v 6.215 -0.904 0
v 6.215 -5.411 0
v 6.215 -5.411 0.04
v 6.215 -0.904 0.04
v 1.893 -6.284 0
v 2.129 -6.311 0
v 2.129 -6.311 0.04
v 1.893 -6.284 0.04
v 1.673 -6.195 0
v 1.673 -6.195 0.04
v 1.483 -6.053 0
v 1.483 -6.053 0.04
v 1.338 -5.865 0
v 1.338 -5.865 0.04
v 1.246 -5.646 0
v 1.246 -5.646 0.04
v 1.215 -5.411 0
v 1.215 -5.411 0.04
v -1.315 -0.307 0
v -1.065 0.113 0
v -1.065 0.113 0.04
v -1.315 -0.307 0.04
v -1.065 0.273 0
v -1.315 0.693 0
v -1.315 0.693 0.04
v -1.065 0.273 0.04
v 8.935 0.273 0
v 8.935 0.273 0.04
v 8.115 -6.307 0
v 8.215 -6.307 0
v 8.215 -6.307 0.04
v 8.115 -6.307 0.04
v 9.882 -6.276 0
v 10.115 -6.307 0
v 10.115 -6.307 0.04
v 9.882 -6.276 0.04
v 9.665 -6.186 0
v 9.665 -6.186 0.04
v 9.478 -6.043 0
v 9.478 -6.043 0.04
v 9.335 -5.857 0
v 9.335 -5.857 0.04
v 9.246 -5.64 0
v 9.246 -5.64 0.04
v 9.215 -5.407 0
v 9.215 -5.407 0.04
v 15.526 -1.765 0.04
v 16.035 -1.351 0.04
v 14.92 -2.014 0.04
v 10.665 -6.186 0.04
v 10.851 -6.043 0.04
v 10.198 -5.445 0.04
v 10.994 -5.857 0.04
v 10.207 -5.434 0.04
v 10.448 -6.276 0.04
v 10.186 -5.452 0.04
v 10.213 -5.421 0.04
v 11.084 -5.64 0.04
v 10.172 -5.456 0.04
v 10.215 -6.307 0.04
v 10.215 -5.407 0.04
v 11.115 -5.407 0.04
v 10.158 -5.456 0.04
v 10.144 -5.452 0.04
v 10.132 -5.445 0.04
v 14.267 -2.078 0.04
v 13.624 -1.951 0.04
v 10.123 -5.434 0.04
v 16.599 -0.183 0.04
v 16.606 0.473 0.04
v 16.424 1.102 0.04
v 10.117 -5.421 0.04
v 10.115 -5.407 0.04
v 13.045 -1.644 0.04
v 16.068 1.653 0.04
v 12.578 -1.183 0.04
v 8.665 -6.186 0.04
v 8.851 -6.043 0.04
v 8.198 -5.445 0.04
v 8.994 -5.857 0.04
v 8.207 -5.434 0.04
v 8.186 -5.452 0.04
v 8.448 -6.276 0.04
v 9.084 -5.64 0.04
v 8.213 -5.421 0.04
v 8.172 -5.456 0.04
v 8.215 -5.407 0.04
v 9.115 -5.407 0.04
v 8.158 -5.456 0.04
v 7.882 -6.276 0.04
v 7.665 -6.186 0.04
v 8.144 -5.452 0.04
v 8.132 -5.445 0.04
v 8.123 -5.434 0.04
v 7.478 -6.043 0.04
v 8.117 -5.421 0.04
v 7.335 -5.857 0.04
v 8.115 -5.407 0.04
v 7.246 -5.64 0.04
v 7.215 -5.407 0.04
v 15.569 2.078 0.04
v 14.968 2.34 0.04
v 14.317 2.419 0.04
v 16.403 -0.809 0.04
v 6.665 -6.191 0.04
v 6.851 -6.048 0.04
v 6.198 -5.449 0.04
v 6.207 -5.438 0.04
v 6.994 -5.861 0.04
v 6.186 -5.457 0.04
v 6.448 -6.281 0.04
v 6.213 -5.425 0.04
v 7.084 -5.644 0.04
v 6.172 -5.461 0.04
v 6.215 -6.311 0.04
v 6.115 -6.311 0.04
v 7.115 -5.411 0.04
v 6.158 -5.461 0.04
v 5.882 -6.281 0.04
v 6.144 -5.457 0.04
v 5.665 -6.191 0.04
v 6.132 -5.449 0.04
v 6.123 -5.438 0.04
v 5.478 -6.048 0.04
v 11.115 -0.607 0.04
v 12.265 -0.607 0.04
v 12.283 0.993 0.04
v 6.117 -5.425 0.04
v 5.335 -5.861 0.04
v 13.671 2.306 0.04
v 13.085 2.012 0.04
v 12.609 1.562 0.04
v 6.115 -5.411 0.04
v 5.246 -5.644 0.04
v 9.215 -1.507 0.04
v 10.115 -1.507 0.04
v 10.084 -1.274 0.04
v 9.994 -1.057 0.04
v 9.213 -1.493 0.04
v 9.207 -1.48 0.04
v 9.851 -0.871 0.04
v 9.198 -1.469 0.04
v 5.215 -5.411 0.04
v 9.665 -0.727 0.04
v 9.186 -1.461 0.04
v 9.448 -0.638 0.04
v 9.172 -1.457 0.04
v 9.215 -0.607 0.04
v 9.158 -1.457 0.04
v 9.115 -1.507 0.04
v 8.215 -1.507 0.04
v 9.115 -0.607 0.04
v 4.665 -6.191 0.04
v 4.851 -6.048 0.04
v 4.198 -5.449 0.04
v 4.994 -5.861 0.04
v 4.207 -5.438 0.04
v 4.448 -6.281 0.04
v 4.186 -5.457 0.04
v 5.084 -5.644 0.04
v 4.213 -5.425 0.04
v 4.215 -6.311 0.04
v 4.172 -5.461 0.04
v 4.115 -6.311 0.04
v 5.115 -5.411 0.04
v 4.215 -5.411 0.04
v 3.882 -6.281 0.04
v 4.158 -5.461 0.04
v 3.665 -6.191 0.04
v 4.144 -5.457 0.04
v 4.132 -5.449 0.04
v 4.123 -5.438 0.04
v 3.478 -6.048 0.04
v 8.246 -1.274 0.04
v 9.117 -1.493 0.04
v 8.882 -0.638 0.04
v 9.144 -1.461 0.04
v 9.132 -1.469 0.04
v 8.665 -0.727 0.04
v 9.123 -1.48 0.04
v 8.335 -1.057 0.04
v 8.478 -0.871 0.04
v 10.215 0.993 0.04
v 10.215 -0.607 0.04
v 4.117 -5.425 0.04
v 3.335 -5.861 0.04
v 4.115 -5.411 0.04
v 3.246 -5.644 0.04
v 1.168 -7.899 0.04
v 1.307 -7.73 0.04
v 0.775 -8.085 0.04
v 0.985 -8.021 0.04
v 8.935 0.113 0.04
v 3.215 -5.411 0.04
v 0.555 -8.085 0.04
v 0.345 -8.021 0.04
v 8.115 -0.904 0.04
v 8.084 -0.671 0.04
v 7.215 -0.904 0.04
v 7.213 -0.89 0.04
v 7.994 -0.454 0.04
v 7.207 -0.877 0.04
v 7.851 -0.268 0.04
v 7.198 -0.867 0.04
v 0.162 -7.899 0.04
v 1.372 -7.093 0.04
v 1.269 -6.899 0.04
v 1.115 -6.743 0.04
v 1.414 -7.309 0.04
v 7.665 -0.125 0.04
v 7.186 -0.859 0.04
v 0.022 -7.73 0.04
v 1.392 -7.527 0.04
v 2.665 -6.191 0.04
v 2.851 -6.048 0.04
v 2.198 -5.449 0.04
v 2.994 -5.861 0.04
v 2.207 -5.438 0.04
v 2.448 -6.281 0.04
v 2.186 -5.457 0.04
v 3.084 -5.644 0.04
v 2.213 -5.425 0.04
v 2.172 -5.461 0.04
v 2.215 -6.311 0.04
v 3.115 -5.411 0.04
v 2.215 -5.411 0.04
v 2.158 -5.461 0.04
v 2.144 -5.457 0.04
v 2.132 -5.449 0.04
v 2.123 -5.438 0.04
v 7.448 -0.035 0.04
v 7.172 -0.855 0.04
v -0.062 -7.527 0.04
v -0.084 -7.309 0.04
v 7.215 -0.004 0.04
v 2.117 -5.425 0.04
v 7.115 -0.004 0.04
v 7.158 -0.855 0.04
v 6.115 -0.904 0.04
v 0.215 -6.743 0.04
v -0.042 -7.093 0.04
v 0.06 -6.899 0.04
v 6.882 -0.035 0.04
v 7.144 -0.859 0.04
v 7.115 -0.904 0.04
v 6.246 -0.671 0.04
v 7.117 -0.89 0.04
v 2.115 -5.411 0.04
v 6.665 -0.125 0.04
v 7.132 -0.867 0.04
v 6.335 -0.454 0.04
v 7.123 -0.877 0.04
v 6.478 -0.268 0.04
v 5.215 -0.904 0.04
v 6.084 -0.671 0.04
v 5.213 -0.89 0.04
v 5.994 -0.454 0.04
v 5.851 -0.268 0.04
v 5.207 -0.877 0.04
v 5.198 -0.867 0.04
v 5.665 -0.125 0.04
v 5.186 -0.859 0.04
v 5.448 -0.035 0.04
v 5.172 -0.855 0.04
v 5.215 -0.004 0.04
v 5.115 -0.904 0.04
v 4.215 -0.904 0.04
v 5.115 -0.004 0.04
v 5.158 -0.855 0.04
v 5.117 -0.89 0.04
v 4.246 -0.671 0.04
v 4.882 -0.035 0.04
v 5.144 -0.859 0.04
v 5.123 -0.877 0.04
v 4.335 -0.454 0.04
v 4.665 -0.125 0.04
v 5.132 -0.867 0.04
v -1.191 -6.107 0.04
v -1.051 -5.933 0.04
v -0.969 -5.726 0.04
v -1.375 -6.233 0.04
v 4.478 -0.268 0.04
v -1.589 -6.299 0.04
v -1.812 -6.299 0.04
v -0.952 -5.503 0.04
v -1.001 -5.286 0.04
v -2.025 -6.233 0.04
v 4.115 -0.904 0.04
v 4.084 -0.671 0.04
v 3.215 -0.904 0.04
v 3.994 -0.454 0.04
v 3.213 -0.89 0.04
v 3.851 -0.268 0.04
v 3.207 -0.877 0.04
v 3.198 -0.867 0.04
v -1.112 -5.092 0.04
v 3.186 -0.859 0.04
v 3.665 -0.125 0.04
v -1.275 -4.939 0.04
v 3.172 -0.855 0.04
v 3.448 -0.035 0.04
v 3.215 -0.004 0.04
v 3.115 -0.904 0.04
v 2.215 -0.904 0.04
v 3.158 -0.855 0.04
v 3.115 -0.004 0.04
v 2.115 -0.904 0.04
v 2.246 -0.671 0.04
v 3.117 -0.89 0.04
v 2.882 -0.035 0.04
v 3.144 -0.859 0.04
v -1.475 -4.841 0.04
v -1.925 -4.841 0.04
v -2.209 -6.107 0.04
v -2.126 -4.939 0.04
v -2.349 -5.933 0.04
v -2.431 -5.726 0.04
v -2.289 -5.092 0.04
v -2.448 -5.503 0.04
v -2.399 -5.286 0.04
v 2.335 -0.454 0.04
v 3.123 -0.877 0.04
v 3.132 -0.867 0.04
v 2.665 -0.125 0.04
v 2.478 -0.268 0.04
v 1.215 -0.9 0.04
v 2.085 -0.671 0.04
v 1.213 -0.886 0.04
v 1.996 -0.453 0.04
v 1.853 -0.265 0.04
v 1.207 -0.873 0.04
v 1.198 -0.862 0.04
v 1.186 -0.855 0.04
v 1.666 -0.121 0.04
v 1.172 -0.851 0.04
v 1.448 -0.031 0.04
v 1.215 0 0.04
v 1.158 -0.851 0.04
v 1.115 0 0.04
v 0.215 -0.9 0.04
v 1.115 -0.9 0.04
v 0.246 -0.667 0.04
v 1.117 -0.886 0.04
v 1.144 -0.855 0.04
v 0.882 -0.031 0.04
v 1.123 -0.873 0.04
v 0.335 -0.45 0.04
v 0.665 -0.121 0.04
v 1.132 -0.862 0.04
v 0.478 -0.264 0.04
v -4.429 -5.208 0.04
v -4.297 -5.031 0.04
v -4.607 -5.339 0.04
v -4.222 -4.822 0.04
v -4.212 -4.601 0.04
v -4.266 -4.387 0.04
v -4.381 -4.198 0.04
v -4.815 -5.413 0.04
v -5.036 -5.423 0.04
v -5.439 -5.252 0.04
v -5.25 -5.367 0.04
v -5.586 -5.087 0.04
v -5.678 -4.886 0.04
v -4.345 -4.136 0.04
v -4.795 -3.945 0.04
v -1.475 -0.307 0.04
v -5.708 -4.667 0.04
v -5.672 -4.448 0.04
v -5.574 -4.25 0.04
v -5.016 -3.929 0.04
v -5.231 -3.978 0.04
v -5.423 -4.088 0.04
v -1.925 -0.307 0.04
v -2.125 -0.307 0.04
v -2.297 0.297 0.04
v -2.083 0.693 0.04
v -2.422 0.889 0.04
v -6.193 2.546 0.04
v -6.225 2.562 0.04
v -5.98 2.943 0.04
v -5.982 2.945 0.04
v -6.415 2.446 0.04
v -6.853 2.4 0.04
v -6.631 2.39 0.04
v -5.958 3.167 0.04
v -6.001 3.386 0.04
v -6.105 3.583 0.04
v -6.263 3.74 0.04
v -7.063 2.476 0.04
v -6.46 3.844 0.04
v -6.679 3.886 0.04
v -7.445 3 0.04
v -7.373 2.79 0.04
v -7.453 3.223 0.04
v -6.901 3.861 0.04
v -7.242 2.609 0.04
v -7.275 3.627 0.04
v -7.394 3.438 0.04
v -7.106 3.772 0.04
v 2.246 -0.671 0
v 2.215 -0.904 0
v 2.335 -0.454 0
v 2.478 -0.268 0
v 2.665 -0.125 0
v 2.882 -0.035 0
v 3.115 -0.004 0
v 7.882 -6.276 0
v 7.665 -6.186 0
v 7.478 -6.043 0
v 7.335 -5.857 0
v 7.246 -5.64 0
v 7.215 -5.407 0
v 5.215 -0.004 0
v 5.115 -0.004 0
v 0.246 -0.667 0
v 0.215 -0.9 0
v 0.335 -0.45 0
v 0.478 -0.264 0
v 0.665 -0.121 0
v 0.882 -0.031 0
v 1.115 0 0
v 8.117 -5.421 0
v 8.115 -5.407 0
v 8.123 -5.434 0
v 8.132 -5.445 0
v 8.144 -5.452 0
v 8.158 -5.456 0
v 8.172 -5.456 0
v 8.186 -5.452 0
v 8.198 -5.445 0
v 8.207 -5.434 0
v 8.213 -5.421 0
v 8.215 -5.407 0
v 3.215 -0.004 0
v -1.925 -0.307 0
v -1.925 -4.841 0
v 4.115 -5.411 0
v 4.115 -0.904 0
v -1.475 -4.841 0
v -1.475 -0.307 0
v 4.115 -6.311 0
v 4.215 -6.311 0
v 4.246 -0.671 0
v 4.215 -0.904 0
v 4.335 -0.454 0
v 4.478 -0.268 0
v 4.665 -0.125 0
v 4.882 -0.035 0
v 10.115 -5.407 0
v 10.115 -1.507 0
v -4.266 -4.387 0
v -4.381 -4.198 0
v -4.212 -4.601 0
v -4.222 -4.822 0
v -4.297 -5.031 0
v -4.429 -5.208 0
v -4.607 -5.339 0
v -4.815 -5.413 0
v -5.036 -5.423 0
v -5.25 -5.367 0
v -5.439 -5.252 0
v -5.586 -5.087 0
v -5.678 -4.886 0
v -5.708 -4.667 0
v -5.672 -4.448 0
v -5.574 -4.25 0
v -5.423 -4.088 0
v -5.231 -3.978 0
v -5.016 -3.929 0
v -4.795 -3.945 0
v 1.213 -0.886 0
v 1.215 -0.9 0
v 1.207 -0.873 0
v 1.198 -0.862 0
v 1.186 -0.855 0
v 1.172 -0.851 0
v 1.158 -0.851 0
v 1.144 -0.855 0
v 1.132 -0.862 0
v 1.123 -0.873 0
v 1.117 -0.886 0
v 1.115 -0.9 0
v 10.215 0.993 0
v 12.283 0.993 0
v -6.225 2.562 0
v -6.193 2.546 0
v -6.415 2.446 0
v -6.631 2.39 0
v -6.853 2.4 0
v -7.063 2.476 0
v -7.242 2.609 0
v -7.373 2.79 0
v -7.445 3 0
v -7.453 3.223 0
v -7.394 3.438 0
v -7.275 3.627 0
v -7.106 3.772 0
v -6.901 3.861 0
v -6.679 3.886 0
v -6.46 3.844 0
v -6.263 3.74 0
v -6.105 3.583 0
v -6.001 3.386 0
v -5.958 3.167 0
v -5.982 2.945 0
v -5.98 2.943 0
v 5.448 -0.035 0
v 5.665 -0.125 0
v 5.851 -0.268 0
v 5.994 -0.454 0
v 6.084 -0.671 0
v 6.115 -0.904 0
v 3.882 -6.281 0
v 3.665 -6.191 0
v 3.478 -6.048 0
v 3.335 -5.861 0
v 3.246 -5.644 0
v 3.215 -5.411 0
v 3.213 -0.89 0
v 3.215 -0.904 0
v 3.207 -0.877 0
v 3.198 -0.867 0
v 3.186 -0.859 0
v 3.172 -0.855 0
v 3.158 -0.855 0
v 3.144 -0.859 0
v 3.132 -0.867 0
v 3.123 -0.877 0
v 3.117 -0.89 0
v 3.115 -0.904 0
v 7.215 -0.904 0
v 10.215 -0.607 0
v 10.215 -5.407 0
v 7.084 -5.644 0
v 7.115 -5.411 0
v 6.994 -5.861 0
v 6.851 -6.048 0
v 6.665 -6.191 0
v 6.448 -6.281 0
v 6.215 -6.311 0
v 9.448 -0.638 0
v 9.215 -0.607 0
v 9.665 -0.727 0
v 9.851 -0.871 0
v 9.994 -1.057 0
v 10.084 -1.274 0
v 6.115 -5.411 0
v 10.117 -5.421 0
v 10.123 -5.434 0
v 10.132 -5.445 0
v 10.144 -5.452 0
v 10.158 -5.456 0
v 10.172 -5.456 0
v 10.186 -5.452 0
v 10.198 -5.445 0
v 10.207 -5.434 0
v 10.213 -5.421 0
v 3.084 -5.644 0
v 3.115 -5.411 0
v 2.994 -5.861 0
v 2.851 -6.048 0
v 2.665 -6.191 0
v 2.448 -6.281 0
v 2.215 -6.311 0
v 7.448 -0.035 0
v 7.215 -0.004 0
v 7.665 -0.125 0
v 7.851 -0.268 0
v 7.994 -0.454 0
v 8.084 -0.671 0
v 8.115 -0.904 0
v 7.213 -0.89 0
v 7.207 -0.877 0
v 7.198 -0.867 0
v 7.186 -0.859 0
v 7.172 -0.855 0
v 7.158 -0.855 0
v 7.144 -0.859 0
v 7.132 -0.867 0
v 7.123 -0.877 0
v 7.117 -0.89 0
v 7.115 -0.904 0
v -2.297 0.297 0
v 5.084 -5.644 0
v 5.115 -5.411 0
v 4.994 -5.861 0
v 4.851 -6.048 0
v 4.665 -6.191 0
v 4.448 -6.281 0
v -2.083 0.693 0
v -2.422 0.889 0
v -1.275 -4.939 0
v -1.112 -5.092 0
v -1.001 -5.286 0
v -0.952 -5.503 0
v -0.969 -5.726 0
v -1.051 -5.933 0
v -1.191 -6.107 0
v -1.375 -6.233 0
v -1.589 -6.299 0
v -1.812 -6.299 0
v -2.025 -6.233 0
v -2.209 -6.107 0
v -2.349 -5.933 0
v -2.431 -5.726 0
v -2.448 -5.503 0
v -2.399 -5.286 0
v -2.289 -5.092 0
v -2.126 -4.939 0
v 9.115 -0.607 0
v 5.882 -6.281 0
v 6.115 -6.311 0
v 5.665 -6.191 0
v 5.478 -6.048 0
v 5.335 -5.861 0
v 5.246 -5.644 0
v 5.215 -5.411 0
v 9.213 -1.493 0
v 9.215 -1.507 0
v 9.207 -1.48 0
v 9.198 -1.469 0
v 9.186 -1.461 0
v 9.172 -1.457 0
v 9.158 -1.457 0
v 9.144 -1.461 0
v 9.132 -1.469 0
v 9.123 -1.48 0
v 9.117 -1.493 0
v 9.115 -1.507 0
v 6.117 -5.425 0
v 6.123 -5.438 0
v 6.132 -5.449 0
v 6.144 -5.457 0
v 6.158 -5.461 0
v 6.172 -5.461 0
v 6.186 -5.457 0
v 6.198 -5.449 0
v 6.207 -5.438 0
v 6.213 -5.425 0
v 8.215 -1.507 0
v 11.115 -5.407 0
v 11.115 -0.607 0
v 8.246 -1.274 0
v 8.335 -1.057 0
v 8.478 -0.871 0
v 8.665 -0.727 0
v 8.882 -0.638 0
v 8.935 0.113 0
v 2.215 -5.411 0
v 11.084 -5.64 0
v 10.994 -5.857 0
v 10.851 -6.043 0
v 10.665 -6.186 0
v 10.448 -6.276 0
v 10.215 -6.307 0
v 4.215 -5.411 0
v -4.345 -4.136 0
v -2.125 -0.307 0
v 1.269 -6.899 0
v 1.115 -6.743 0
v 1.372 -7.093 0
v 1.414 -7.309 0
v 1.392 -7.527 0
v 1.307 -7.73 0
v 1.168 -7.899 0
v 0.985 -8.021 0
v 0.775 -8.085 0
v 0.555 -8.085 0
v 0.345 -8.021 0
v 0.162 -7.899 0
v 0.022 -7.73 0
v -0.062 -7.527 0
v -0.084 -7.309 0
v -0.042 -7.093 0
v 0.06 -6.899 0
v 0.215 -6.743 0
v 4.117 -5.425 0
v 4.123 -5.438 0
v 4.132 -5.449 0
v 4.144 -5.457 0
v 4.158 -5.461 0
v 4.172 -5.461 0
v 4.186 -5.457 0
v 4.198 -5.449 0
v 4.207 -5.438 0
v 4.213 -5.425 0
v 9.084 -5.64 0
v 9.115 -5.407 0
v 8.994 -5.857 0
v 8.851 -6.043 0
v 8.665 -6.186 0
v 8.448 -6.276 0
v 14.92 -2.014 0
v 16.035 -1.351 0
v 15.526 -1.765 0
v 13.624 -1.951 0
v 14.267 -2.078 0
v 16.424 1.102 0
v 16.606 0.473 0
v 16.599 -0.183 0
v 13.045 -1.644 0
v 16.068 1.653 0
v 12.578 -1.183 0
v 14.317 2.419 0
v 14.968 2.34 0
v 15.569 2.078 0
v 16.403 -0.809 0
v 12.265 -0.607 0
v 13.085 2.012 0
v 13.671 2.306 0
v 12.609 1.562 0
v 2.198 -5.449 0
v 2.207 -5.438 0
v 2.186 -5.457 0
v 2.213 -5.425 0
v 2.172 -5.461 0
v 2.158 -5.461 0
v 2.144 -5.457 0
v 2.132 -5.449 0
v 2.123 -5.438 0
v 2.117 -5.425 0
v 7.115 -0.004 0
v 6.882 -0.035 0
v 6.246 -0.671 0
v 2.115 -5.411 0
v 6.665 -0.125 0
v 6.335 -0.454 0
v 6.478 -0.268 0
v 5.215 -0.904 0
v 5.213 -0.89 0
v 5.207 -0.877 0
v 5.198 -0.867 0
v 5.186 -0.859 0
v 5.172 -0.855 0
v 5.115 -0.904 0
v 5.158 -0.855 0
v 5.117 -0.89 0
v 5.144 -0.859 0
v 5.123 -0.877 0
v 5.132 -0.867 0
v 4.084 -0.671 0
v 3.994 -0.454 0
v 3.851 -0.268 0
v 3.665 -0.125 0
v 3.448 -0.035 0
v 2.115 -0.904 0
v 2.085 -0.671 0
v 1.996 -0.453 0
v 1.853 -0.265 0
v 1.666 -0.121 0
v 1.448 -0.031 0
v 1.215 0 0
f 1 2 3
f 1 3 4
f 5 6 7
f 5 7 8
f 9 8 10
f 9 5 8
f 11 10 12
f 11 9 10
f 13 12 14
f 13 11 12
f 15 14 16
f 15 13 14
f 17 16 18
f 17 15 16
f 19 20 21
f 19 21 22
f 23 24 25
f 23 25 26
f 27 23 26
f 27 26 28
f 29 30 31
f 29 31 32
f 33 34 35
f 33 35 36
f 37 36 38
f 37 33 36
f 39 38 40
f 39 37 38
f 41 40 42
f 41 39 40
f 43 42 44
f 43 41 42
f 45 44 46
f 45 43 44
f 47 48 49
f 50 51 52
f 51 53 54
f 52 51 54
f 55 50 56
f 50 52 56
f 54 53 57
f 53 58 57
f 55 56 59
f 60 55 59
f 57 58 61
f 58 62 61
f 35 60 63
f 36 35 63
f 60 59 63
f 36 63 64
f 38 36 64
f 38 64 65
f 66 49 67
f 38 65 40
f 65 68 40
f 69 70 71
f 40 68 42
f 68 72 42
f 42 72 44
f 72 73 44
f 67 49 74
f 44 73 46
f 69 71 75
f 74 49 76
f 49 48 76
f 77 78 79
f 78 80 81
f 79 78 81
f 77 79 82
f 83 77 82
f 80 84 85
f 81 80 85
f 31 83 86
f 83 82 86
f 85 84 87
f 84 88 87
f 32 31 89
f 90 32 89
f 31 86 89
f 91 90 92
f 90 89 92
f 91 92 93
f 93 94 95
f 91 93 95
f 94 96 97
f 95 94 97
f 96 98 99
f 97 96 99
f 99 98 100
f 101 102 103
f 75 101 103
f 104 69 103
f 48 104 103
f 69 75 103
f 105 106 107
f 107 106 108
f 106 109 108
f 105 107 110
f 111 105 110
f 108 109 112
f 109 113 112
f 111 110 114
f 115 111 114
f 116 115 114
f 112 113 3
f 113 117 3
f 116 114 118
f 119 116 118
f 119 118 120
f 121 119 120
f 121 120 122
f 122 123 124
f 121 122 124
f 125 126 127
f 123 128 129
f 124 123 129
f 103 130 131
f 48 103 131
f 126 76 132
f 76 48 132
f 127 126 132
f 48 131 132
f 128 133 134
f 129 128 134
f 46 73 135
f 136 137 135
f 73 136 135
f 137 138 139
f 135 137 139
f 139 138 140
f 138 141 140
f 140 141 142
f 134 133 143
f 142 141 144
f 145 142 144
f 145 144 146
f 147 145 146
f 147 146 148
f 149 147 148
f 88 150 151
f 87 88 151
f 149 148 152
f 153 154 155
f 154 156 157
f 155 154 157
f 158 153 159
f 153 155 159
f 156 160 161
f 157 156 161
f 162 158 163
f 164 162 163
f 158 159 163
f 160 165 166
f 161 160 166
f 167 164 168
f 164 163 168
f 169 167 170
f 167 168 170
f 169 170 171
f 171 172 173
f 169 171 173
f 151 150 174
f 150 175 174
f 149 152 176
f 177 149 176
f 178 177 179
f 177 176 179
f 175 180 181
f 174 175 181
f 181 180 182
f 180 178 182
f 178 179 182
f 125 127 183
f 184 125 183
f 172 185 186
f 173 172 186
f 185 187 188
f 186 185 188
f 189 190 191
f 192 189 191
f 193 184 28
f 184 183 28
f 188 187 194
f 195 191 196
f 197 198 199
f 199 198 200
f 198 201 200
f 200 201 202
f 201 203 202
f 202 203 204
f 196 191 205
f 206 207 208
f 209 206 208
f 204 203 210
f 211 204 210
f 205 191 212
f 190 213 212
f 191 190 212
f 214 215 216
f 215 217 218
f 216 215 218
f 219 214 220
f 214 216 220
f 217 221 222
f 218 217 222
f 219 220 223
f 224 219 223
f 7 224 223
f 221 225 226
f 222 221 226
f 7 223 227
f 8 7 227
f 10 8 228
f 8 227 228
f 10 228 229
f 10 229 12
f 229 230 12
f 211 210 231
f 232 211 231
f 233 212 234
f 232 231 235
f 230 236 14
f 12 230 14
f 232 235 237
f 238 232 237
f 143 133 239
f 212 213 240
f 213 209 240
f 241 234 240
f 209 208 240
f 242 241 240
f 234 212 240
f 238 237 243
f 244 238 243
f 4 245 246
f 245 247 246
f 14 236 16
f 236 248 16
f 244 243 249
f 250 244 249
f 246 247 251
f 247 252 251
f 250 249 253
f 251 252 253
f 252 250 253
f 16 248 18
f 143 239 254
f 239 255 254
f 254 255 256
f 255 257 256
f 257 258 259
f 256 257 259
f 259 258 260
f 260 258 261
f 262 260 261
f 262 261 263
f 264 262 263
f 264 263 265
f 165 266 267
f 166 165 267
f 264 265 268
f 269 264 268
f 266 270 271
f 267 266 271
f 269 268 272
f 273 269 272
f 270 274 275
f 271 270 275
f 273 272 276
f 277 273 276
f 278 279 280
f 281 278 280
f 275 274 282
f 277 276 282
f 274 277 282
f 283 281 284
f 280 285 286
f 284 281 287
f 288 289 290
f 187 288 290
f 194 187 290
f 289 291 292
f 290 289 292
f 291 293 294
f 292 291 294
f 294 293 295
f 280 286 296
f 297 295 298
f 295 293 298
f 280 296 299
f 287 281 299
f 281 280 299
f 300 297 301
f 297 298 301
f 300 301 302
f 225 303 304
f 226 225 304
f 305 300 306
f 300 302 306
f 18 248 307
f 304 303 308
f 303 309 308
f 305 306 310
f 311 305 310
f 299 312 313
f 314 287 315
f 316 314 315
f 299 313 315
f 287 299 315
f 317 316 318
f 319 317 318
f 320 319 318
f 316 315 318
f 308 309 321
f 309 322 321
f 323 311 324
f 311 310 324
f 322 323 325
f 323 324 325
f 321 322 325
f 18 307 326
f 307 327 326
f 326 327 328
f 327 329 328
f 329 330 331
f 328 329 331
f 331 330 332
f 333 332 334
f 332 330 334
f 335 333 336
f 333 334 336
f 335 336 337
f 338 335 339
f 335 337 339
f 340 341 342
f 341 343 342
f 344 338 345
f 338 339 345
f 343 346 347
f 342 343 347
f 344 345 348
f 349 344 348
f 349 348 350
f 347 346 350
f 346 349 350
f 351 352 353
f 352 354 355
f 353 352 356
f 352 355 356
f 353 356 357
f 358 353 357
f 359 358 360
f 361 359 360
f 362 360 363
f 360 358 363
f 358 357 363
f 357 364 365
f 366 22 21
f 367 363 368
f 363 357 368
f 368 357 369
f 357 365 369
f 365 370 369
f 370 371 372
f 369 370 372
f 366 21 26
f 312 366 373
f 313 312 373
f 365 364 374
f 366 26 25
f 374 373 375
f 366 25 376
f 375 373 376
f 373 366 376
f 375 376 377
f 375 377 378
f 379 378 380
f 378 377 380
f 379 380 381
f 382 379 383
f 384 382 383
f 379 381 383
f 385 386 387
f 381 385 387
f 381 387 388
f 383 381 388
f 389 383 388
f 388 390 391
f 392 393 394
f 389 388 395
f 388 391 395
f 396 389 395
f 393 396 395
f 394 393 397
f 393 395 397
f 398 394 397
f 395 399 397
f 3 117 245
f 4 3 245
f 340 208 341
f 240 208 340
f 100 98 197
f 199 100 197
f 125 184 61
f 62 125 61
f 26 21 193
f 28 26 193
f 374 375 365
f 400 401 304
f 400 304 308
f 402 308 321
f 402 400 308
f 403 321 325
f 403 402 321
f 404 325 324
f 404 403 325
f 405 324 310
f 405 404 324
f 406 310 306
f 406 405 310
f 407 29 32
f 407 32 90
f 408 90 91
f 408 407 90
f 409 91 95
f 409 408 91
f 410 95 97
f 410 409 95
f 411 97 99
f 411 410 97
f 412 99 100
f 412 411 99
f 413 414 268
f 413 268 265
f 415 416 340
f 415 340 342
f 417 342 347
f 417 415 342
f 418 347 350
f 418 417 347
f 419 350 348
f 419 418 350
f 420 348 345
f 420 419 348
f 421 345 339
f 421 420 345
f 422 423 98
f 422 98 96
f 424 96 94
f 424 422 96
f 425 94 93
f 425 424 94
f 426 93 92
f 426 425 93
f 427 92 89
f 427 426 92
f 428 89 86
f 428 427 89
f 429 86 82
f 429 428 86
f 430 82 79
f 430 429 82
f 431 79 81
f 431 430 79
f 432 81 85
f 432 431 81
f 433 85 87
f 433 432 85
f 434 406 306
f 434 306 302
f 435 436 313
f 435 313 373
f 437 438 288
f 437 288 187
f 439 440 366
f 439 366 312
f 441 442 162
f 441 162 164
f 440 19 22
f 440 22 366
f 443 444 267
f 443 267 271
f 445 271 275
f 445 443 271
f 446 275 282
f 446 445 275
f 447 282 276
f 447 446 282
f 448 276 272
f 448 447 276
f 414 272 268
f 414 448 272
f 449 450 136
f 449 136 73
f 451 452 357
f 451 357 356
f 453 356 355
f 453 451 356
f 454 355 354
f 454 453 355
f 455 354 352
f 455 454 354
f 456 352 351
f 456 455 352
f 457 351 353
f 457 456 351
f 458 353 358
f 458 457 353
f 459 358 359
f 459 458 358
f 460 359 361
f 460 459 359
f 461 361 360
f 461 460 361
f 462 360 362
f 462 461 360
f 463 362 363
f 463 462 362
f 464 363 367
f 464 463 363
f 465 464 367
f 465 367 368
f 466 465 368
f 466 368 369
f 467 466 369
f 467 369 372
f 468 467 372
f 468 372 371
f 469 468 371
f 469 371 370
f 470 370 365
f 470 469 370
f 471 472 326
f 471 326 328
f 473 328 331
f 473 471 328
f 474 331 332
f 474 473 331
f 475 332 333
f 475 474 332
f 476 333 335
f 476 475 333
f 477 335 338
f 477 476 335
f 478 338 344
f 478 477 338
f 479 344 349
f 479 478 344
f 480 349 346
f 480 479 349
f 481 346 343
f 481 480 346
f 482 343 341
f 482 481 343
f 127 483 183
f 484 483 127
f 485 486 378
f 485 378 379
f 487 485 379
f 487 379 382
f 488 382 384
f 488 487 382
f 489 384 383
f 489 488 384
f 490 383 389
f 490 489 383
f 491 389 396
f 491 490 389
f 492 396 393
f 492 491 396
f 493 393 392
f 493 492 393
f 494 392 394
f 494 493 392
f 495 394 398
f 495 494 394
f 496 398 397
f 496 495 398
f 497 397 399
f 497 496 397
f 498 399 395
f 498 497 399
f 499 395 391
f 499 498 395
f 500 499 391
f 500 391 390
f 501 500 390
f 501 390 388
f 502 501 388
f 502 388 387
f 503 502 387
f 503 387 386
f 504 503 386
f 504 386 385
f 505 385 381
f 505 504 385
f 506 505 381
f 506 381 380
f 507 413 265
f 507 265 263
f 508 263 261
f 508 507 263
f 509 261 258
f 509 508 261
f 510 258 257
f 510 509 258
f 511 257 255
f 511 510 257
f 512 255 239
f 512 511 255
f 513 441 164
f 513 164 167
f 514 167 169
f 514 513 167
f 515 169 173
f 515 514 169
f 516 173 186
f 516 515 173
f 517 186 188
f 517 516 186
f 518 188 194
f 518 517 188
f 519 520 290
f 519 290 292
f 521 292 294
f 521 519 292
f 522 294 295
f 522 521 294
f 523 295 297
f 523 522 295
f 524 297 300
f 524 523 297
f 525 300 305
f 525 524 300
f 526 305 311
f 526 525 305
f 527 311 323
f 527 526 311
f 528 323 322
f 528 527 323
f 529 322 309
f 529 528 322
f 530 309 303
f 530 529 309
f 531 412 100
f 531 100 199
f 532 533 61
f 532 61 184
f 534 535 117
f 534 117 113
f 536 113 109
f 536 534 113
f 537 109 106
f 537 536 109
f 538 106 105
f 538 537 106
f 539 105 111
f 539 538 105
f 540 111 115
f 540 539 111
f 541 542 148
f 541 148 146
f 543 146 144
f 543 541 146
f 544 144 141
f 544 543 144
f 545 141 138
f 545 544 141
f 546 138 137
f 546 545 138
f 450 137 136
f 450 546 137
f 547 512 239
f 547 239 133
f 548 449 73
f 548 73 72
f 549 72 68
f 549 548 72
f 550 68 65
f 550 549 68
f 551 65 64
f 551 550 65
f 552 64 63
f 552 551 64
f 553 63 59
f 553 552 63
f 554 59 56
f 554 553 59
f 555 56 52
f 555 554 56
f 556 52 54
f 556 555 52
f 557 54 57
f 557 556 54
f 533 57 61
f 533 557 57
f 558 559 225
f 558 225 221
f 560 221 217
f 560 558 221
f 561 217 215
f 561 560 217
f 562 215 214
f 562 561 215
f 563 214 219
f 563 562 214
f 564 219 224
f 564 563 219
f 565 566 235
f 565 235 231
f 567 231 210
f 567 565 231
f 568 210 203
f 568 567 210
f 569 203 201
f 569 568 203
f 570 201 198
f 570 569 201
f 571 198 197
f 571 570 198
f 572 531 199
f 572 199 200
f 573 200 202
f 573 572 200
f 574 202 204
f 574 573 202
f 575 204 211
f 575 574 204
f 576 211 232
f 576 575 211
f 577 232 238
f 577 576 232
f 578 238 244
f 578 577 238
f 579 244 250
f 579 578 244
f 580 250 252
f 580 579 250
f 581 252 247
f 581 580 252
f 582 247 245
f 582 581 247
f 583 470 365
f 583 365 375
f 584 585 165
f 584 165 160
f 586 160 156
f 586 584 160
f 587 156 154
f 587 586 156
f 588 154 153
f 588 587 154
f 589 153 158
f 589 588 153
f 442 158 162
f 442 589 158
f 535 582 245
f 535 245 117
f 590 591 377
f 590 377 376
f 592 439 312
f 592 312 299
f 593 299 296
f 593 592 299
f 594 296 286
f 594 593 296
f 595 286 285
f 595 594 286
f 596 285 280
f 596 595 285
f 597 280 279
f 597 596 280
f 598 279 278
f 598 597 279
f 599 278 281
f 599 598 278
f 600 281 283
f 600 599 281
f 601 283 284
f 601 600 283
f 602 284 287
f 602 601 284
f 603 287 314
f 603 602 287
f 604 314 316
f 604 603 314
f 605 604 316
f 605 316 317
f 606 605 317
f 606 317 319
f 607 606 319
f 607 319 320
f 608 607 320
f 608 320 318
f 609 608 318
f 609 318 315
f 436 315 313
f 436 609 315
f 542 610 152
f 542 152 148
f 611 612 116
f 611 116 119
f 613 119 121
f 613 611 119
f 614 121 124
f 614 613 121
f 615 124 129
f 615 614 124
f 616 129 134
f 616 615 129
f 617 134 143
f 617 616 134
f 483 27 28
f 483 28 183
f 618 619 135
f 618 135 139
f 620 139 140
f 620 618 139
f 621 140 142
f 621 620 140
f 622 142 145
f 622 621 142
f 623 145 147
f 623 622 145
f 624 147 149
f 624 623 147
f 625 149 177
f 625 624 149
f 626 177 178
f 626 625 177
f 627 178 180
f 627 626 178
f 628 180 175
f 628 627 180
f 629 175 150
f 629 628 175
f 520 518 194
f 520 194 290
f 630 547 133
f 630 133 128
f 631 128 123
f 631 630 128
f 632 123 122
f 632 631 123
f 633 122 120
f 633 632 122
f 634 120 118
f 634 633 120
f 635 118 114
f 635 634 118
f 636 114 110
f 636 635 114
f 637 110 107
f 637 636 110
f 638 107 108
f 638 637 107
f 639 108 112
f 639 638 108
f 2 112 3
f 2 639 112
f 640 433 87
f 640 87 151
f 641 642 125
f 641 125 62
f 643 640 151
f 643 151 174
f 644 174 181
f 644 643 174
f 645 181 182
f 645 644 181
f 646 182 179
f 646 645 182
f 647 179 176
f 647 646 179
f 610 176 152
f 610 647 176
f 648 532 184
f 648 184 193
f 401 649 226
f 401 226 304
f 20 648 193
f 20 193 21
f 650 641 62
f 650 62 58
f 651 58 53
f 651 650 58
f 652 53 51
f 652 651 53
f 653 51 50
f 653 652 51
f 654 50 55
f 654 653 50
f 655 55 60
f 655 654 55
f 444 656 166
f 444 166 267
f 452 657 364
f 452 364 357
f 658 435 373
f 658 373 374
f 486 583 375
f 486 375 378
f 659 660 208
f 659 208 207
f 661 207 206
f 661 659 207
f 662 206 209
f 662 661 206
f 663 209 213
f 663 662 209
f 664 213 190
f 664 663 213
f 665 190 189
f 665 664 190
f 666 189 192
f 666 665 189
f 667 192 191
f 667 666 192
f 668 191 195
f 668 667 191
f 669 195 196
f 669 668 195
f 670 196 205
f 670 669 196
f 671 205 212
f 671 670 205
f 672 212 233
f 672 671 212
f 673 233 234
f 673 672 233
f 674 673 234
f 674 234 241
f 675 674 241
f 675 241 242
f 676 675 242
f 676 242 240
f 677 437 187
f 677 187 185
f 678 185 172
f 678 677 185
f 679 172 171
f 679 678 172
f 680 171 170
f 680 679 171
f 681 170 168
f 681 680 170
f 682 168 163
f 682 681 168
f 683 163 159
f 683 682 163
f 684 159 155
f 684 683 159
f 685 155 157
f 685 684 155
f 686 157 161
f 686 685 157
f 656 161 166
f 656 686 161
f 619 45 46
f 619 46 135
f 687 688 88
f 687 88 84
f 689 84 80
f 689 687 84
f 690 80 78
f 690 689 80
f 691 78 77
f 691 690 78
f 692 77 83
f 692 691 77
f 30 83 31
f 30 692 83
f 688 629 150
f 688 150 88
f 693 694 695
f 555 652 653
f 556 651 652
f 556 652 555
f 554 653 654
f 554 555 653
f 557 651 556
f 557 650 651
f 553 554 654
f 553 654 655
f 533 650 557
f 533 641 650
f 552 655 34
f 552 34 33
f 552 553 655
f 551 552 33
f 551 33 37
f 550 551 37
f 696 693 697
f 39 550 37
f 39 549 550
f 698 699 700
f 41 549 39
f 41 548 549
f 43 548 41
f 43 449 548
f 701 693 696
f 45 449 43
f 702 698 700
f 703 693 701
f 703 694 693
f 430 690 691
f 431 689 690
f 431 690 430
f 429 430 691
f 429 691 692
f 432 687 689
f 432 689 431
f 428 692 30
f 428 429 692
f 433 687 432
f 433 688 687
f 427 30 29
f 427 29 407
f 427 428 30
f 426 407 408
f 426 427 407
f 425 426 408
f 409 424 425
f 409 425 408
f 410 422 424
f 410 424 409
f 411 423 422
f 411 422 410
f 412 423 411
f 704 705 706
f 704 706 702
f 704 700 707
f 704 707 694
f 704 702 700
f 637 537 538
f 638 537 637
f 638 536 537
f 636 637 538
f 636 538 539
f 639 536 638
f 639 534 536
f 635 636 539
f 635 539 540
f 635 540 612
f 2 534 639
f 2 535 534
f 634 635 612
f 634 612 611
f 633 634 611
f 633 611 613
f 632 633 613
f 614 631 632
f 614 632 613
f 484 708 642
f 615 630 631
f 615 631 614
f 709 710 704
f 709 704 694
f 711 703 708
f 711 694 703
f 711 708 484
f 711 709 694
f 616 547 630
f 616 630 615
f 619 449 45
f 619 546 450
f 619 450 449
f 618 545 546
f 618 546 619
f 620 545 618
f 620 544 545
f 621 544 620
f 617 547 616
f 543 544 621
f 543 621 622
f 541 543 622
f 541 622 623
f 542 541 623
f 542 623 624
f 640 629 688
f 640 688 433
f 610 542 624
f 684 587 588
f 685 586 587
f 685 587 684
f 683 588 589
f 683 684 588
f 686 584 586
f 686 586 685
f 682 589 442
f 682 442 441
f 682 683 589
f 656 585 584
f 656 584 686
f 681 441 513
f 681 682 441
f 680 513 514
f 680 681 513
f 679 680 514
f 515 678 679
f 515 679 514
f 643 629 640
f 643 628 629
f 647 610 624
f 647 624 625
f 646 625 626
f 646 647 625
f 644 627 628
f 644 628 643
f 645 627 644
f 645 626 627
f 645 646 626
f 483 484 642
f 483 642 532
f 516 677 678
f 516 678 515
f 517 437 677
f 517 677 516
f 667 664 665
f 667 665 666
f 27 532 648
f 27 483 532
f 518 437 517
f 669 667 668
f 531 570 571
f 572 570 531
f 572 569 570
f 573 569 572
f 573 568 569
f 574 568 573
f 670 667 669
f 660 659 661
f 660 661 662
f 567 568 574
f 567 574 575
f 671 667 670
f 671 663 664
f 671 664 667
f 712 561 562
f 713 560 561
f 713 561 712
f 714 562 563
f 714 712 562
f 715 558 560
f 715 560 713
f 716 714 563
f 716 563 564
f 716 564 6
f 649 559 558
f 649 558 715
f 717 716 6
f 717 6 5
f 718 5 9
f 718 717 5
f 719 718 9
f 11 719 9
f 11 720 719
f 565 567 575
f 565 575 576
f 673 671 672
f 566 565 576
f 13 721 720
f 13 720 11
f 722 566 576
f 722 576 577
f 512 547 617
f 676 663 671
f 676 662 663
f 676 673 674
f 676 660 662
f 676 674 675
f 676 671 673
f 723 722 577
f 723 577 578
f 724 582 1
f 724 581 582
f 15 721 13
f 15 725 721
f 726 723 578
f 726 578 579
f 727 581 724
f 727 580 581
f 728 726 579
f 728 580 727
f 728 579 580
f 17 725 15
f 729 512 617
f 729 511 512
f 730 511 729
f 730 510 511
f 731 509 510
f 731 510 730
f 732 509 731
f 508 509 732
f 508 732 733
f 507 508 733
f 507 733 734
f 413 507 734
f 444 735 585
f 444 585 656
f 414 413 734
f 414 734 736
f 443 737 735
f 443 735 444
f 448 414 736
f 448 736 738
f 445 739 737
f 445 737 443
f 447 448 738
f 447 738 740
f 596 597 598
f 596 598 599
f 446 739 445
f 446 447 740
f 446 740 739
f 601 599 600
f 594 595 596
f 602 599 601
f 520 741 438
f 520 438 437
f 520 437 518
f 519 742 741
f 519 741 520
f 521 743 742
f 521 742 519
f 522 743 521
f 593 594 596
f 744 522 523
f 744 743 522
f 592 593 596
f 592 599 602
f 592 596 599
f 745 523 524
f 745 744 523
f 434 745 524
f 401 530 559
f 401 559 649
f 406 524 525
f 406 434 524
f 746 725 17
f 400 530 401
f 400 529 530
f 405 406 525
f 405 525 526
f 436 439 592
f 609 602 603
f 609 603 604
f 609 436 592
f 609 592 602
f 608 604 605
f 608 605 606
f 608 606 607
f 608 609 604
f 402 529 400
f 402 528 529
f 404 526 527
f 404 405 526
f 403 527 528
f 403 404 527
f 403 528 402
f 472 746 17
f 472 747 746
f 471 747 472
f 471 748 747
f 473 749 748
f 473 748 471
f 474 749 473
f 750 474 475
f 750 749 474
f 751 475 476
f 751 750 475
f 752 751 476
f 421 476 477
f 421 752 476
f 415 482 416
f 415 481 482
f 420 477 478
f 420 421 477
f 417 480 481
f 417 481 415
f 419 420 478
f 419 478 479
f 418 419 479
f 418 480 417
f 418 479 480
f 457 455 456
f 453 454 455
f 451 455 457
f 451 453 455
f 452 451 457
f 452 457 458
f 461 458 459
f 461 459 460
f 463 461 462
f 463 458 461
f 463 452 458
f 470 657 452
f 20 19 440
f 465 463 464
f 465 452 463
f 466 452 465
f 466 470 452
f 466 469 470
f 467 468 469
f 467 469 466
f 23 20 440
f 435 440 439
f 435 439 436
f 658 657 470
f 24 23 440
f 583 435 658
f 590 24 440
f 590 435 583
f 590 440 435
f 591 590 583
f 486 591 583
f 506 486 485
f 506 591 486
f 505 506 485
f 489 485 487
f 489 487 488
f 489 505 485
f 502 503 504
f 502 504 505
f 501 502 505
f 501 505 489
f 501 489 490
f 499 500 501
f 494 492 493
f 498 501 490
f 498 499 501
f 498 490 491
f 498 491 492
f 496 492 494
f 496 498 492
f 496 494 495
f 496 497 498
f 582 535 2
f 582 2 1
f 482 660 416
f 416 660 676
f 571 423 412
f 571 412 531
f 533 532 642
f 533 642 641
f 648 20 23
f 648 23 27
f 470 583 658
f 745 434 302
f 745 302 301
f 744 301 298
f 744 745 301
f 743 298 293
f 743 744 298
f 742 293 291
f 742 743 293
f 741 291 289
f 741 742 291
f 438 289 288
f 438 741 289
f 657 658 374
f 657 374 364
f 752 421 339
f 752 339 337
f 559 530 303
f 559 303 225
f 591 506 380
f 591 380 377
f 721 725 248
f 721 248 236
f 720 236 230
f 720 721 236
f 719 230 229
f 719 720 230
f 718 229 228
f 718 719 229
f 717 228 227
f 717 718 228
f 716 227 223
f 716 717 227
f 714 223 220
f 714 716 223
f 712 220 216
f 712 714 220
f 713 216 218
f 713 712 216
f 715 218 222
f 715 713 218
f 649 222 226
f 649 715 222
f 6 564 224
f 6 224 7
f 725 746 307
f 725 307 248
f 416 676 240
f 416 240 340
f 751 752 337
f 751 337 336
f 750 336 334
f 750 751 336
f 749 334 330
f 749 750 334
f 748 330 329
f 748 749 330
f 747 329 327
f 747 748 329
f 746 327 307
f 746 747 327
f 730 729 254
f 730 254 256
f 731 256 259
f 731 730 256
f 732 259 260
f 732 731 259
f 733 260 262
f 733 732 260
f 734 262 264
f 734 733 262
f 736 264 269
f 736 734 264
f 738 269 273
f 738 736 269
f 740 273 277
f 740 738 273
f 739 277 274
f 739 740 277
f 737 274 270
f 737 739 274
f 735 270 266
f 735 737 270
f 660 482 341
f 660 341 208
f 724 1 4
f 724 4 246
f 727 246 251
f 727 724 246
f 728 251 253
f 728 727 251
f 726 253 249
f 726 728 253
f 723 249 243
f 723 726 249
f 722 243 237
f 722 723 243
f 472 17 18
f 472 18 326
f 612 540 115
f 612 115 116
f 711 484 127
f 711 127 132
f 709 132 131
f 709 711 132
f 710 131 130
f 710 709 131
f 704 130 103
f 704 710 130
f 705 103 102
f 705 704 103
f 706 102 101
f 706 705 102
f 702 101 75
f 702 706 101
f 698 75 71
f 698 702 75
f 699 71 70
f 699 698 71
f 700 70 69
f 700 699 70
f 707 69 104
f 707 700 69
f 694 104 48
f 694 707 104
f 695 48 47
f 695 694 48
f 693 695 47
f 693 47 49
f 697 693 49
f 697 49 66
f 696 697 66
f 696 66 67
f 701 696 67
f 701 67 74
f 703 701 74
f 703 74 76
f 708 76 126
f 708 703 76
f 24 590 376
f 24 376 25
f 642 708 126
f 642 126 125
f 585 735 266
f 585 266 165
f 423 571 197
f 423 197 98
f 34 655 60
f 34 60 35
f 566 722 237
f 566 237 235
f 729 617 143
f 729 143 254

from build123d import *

# Parameters (mm, degrees)
BOSS_EXTRUDE1_DEPTH = 0.04


with BuildPart() as part:
    # Sketch1 → Boss-Extrude1 (new body)
    with BuildSketch(Plane.XY):
        with BuildLine():
            Line((-1.315144017, 0.693084069), (-1.065144017, 0.273084069))
            Line((-1.065144017, 0.273084069), (8.934855983, 0.273084069))
            Line((8.934855983, 0.273084069), (10.214855983, 0.993084069))
            Line((10.214855983, 0.993084069), (10.514506575, 0.993084069))
            Line((10.514506575, 0.993084069), (10.935378928, 0.993084069))
            Line((10.935378928, 0.993084069), (12.282731088, 0.993084069))
            ThreePointArc((12.282731088, 0.993084069), (16.626477002, 0.144456147), (12.264855983, -0.606915931))
            Line((12.264855983, -0.606915931), (11.114855983, -0.606915931))
            Line((11.114855983, -0.606915931), (11.114855983, -5.406915931))
            ThreePointArc((11.114855983, -5.406915931), (10.851252086, -6.043312034), (10.214855983, -6.306915931))
            Line((10.214855983, -6.306915931), (10.114855983, -6.306915931))
            ThreePointArc((10.114855983, -6.306915931), (9.47845988, -6.043312034), (9.214855983, -5.406915931))
            Line((9.214855983, -5.406915931), (9.214855983, -1.506915931))
            ThreePointArc((9.214855983, -1.506915931), (9.164855983, -1.456915931), (9.114855983, -1.506915931))
            Line((9.114855983, -1.506915931), (9.114855983, -5.406915931))
            ThreePointArc((9.114855983, -5.406915931), (8.851252086, -6.043312034), (8.214855983, -6.306915931))
            Line((8.214855983, -6.306915931), (8.114855983, -6.306915931))
            ThreePointArc((8.114855983, -6.306915931), (7.47845988, -6.043312034), (7.214855983, -5.406915931))
            Line((7.214855983, -5.406915931), (7.214855983, -0.904335528))
            ThreePointArc((7.214855983, -0.904335528), (7.164855983, -0.854335528), (7.114855983, -0.904335528))
            Line((7.114855983, -0.904335528), (7.114855983, -5.4112515))
            ThreePointArc((7.114855983, -5.4112515), (6.851252086, -6.047647603), (6.214855983, -6.3112515))
            Line((6.214855983, -6.3112515), (6.114855983, -6.3112515))
            ThreePointArc((6.114855983, -6.3112515), (5.47845988, -6.047647603), (5.214855983, -5.4112515))
            Line((5.214855983, -5.4112515), (5.214855983, -0.90433553))
            ThreePointArc((5.214855983, -0.90433553), (5.164851284, -0.85433083), (5.114846585, -0.90433553))
            Line((5.114846585, -0.90433553), (5.114846585, -5.4112515))
            ThreePointArc((5.114846585, -5.4112515), (4.851242688, -6.047647603), (4.214846585, -6.3112515))
            Line((4.214846585, -6.3112515), (4.114855983, -6.3112515))
            ThreePointArc((4.114855983, -6.3112515), (3.47845988, -6.047647603), (3.214855983, -5.4112515))
            Line((3.214855983, -5.4112515), (3.214855983, -0.90433553))
            ThreePointArc((3.214855983, -0.90433553), (3.164851284, -0.85433083), (3.114846585, -0.90433553))
            Line((3.114846585, -0.90433553), (3.114846585, -5.4112515))
            ThreePointArc((3.114846585, -5.4112515), (2.851242688, -6.047647603), (2.214846585, -6.3112515))
            Line((2.214846585, -6.3112515), (2.128594735, -6.3112515))
            ThreePointArc((2.128594735, -6.3112515), (1.483323335, -6.05252673), (1.214846585, -5.4112515))
            Line((1.214846585, -5.4112515), (1.214846585, -0.9))
            ThreePointArc((1.214846585, -0.9), (1.164846585, -0.85), (1.114846585, -0.9))
            Line((1.114846585, -0.9), (1.114846585, -6.592929893))
            Line((1.114846585, -6.592929893), (1.114846585, -6.742929893))
            ThreePointArc((1.114846585, -6.742929893), (0.664846585, -8.092929893), (0.214846585, -6.742929893))
            Line((0.214846585, -6.742929893), (0.214846585, -6.592929893))
            Line((0.214846585, -6.592929893), (0.214846585, -0.9))
            ThreePointArc((0.214846585, -0.9), (0.478450482, -0.263603897), (1.114846585, 0))
            Line((1.114846585, 0), (1.214846585, 0))
            ThreePointArc((1.214846585, 0), (1.852773687, -0.265138589), (2.114836142, -0.90433553))
            Line((2.114836142, -0.90433553), (2.114950011, -5.4112515))
            ThreePointArc((2.114950011, -5.4112515), (2.164898298, -5.461199786), (2.214846585, -5.4112515))
            Line((2.214846585, -5.4112515), (2.214846585, -0.90433553))
            ThreePointArc((2.214846585, -0.90433553), (2.478450482, -0.267939426), (3.114846585, -0.00433553))
            Line((3.114846585, -0.00433553), (3.214855983, -0.00433553))
            ThreePointArc((3.214855983, -0.00433553), (3.851252086, -0.267939426), (4.114855983, -0.90433553))
            Line((4.114855983, -0.90433553), (4.114855983, -5.4112515))
            ThreePointArc((4.114855983, -5.4112515), (4.164851284, -5.4612468), (4.214846585, -5.4112515))
            Line((4.214846585, -5.4112515), (4.214846585, -0.90433553))
            ThreePointArc((4.214846585, -0.90433553), (4.478450482, -0.267939426), (5.114846585, -0.00433553))
            Line((5.114846585, -0.00433553), (5.214855983, -0.00433553))
            ThreePointArc((5.214855983, -0.00433553), (5.851252086, -0.267939426), (6.114855983, -0.90433553))
            Line((6.114855983, -0.90433553), (6.114855983, -5.4112515))
            ThreePointArc((6.114855983, -5.4112515), (6.164855983, -5.4612515), (6.214855983, -5.4112515))
            Line((6.214855983, -5.4112515), (6.214855983, -0.904335528))
            ThreePointArc((6.214855983, -0.904335528), (6.47845988, -0.267939425), (7.114855983, -0.004335528))
            Line((7.114855983, -0.004335528), (7.214855983, -0.004335528))
            ThreePointArc((7.214855983, -0.004335528), (7.851252086, -0.267939425), (8.114855983, -0.904335528))
            Line((8.114855983, -0.904335528), (8.114855983, -5.406915931))
            ThreePointArc((8.114855983, -5.406915931), (8.164855983, -5.456915931), (8.214855983, -5.406915931))
            Line((8.214855983, -5.406915931), (8.214855983, -1.506915931))
            ThreePointArc((8.214855983, -1.506915931), (8.47845988, -0.870519828), (9.114855983, -0.606915931))
            Line((9.114855983, -0.606915931), (9.214855983, -0.606915931))
            ThreePointArc((9.214855983, -0.606915931), (9.851252086, -0.870519828), (10.114855983, -1.506915931))
            Line((10.114855983, -1.506915931), (10.114855983, -5.406915931))
            ThreePointArc((10.114855983, -5.406915931), (10.164855983, -5.456915931), (10.214855983, -5.406915931))
            Line((10.214855983, -5.406915931), (10.214855983, -0.606915931))
            Line((10.214855983, -0.606915931), (8.934855983, 0.113084069))
            Line((8.934855983, 0.113084069), (-1.065144017, 0.113084069))
            Line((-1.065144017, 0.113084069), (-1.315144017, -0.306915931))
            Line((-1.315144017, -0.306915931), (-1.475144017, -0.306915931))
            Line((-1.475144017, -0.306915931), (-1.475144017, -4.82261796))
            Line((-1.475144017, -4.82261796), (-1.475144017, -4.84146153))
            ThreePointArc((-1.475144017, -4.84146153), (-1.700144017, -6.306915931), (-1.925144017, -4.84146153))
            Line((-1.925144017, -4.84146153), (-1.925144017, -4.806915931))
            Line((-1.925144017, -4.806915931), (-1.925144017, -0.306915931))
            Line((-1.925144017, -0.306915931), (-2.125144017, -0.306915931))
            Line((-2.125144017, -0.306915931), (-4.345243658, -4.136400695))
            Line((-4.345243658, -4.136400695), (-4.380795568, -4.197724742))
            ThreePointArc((-4.380795568, -4.197724742), (-5.348898376, -5.316761949), (-4.795009179, -3.94465624))
            Line((-4.795009179, -3.94465624), (-2.296869562, 0.296921546))
            Line((-2.296869562, 0.296921546), (-6.192755194, 2.546212165))
            Line((-6.192755194, 2.546212165), (-6.224617122, 2.562462753))
            ThreePointArc((-6.224617122, 2.562462753), (-7.341518741, 3.537122923), (-5.982350992, 2.945434913))
            Line((-5.982350992, 2.945434913), (-5.980157496, 2.943084069))
            Line((-5.980157496, 2.943084069), (-2.421936306, 0.888744107))
            Line((-2.421936306, 0.888744107), (-2.083043179, 0.693084069))
            Line((-2.083043179, 0.693084069), (-1.625493347, 0.693084069))
            Line((-1.625493347, 0.693084069), (-1.315144017, 0.693084069))
        make_face()
    extrude(amount=BOSS_EXTRUDE1_DEPTH)


solid = part.part
